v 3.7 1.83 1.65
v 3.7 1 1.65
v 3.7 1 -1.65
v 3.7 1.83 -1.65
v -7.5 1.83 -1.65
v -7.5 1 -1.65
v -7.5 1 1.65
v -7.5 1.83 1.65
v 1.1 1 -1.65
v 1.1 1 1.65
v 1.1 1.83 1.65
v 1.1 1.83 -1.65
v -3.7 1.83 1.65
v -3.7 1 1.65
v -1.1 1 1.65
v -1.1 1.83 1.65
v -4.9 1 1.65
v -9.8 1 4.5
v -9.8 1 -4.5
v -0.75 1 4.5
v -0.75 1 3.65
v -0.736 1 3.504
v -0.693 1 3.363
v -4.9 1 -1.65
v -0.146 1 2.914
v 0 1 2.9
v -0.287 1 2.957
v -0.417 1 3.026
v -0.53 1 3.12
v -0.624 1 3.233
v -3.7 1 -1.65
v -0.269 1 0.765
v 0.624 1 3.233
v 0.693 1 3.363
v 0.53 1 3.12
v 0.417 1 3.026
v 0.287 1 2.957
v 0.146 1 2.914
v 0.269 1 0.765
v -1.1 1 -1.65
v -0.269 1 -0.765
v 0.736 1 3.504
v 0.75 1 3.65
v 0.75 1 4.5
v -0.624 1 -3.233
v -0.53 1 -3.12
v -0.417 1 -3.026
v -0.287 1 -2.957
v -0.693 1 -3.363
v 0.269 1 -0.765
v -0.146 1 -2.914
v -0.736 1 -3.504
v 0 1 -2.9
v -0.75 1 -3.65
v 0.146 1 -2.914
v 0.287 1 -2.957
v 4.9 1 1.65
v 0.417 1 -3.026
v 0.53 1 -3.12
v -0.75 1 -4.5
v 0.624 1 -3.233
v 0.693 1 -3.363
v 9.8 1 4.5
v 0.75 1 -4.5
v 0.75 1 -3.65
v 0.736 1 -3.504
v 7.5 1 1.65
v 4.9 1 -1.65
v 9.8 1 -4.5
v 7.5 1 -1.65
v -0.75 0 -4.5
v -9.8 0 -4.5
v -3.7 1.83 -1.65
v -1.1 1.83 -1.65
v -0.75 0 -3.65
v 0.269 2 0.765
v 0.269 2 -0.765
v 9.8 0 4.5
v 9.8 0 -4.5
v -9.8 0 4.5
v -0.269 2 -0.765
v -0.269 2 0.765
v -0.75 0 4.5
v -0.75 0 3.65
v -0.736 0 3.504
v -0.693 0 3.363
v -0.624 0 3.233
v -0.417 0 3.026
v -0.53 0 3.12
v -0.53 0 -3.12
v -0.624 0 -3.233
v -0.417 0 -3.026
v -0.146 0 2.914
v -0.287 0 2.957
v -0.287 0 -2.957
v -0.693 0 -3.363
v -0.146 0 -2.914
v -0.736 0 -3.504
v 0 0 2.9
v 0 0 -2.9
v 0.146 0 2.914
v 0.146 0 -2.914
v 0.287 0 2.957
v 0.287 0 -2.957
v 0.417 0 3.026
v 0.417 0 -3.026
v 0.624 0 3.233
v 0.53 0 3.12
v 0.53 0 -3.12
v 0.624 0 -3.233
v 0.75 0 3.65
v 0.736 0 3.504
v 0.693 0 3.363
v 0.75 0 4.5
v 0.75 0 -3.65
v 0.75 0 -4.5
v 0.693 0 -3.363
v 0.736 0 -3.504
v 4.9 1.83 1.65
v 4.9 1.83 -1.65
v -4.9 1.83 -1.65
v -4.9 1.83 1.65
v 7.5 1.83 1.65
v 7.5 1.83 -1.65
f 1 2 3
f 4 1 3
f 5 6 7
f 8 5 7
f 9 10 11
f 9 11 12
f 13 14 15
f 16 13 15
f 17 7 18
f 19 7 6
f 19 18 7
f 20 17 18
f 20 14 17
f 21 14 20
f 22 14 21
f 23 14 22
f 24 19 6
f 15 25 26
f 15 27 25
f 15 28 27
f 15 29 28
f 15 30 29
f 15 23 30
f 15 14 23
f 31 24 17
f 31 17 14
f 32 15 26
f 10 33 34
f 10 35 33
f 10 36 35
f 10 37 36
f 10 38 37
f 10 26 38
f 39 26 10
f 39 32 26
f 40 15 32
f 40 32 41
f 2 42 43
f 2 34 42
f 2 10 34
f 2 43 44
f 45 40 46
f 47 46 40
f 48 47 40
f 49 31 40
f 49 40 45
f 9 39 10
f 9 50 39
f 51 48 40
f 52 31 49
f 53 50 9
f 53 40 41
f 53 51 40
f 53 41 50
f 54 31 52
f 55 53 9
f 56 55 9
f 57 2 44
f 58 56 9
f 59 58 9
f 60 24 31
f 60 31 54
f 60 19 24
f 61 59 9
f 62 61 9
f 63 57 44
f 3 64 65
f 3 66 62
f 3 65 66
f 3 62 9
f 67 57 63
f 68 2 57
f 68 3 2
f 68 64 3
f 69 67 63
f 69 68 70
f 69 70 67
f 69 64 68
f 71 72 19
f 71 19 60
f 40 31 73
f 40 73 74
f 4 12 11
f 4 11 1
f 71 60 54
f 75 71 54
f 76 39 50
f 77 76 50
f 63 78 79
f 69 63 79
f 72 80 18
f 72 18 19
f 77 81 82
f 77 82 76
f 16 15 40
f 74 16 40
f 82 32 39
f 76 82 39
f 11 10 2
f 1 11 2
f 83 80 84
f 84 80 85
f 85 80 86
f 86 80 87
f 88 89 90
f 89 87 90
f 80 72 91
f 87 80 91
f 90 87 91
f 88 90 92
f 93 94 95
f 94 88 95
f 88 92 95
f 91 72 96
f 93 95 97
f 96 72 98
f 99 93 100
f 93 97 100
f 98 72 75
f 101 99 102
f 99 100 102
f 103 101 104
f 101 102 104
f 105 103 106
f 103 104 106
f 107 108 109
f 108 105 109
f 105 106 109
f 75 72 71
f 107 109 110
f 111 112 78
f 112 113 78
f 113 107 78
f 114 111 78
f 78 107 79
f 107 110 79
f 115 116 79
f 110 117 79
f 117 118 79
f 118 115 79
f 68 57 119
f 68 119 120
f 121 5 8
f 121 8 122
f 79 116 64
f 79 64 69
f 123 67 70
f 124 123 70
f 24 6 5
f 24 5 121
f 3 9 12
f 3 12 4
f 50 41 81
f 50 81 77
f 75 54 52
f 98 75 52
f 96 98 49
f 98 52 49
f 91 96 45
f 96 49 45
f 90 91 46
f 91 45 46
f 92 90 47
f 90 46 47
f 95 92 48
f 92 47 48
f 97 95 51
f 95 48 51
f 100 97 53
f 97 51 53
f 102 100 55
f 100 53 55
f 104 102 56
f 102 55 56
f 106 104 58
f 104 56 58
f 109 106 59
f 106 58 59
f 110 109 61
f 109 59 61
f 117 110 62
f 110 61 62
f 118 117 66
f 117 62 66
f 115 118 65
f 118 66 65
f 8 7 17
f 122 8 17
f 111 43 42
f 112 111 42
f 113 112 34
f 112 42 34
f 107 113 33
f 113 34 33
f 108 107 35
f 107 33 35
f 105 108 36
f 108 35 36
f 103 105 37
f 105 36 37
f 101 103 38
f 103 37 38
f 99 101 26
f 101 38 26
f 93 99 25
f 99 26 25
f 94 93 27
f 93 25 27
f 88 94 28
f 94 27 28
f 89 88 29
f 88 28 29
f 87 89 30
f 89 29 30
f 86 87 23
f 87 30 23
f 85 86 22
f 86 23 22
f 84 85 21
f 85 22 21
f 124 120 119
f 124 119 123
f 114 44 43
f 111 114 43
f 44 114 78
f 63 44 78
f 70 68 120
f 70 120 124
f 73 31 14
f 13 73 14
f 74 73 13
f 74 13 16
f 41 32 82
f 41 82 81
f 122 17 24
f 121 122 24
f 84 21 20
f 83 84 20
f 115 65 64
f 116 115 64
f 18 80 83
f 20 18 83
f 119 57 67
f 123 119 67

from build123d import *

# Parameters (mm, degrees)
SKETCH_1_W          = 19.6
SKETCH_1_H          = 9
EXTRUDE_1_DEPTH     = 1
CUT_EXTRUDE_1_DEPTH = 11.830050785
SKETCH_4_W          = 2.6
SKETCH_4_H          = 1.65
SKETCH_4_H_2        = 3.3
EXTRUDE_2_DEPTH     = 0.83
SKETCH_3_W          = 0.537571624
SKETCH_3_H          = 1.530011548
EXTRUDE_3_DEPTH     = 1


with BuildPart() as part:
    # 草图1 → 凸台-拉伸1 (new body)
    with BuildSketch(Plane(origin=(0, 0, 0), x_dir=(1, 0, 0), z_dir=(0, 1, 0))):
        Rectangle(SKETCH_1_W, SKETCH_1_H)
    extrude(amount=EXTRUDE_1_DEPTH)

    # 草图2 → 切除-拉伸1 (cut, through all)
    with BuildSketch(Plane(origin=(0, 1, 0), x_dir=(1, 0, 0), z_dir=(0, 1, 0))):
        with BuildLine():
            Line((0.75, 4.5), (-0.75, 4.5))
            Line((-0.75, 4.5), (-0.75, 3.65))
            ThreePointArc((-0.75, 3.65), (0, 4.4), (0.75, 3.65))
            Line((0.75, 3.65), (0.75, 4.5))
        make_face()
        with BuildLine():
            ThreePointArc((0.75, 3.65), (0, 4.4), (-0.75, 3.65))
            Line((-0.75, 3.65), (0.75, 3.65))
        make_face()
        with BuildLine():
            Line((0.75, 3.65), (-0.75, 3.65))
            ThreePointArc((-0.75, 3.65), (0, 2.9), (0.75, 3.65))
        make_face()
        with BuildLine():
            ThreePointArc((0.75, -3.65), (0, -2.9), (-0.75, -3.65))
            Line((-0.75, -3.65), (0.75, -3.65))
        make_face()
        with BuildLine():
            Line((0.75, -3.65), (-0.75, -3.65))
            ThreePointArc((-0.75, -3.65), (0, -4.4), (0.75, -3.65))
        make_face()
        with BuildLine():
            ThreePointArc((0.75, -3.65), (0, -4.4), (-0.75, -3.65))
            Line((-0.75, -3.65), (-0.75, -4.5))
            Line((-0.75, -4.5), (0.75, -4.5))
            Line((0.75, -4.5), (0.75, -3.65))
        make_face()
    extrude(amount=-CUT_EXTRUDE_1_DEPTH, mode=Mode.SUBTRACT)

    # 草图4 → 凸台-拉伸2 (add)
    with BuildSketch(Plane(origin=(0, 1, 0), x_dir=(1, 0, 0), z_dir=(0, 1, 0))):
        with Locations((-6.2, 0.825)):
            Rectangle(SKETCH_4_W, SKETCH_4_H)
        with Locations((-6.2, -0.825)):
            Rectangle(SKETCH_4_W, SKETCH_4_H)
        with Locations((-2.4, 0.825)):
            Rectangle(SKETCH_4_W, SKETCH_4_H)
        with Locations((-2.4, -0.825)):
            Rectangle(SKETCH_4_W, SKETCH_4_H)
        with Locations((2.4, 0)):
            Rectangle(SKETCH_4_W, SKETCH_4_H_2)
        with Locations((6.2, 0)):
            Rectangle(SKETCH_4_W, SKETCH_4_H_2)
    extrude(amount=EXTRUDE_2_DEPTH)

    # 草图3 → 凸台-拉伸3 (add)
    with BuildSketch(Plane(origin=(0, 1, 0), x_dir=(1, 0, 0), z_dir=(0, 1, 0))):
        Rectangle(SKETCH_3_W, SKETCH_3_H)
    extrude(amount=EXTRUDE_3_DEPTH)


solid = part.part
